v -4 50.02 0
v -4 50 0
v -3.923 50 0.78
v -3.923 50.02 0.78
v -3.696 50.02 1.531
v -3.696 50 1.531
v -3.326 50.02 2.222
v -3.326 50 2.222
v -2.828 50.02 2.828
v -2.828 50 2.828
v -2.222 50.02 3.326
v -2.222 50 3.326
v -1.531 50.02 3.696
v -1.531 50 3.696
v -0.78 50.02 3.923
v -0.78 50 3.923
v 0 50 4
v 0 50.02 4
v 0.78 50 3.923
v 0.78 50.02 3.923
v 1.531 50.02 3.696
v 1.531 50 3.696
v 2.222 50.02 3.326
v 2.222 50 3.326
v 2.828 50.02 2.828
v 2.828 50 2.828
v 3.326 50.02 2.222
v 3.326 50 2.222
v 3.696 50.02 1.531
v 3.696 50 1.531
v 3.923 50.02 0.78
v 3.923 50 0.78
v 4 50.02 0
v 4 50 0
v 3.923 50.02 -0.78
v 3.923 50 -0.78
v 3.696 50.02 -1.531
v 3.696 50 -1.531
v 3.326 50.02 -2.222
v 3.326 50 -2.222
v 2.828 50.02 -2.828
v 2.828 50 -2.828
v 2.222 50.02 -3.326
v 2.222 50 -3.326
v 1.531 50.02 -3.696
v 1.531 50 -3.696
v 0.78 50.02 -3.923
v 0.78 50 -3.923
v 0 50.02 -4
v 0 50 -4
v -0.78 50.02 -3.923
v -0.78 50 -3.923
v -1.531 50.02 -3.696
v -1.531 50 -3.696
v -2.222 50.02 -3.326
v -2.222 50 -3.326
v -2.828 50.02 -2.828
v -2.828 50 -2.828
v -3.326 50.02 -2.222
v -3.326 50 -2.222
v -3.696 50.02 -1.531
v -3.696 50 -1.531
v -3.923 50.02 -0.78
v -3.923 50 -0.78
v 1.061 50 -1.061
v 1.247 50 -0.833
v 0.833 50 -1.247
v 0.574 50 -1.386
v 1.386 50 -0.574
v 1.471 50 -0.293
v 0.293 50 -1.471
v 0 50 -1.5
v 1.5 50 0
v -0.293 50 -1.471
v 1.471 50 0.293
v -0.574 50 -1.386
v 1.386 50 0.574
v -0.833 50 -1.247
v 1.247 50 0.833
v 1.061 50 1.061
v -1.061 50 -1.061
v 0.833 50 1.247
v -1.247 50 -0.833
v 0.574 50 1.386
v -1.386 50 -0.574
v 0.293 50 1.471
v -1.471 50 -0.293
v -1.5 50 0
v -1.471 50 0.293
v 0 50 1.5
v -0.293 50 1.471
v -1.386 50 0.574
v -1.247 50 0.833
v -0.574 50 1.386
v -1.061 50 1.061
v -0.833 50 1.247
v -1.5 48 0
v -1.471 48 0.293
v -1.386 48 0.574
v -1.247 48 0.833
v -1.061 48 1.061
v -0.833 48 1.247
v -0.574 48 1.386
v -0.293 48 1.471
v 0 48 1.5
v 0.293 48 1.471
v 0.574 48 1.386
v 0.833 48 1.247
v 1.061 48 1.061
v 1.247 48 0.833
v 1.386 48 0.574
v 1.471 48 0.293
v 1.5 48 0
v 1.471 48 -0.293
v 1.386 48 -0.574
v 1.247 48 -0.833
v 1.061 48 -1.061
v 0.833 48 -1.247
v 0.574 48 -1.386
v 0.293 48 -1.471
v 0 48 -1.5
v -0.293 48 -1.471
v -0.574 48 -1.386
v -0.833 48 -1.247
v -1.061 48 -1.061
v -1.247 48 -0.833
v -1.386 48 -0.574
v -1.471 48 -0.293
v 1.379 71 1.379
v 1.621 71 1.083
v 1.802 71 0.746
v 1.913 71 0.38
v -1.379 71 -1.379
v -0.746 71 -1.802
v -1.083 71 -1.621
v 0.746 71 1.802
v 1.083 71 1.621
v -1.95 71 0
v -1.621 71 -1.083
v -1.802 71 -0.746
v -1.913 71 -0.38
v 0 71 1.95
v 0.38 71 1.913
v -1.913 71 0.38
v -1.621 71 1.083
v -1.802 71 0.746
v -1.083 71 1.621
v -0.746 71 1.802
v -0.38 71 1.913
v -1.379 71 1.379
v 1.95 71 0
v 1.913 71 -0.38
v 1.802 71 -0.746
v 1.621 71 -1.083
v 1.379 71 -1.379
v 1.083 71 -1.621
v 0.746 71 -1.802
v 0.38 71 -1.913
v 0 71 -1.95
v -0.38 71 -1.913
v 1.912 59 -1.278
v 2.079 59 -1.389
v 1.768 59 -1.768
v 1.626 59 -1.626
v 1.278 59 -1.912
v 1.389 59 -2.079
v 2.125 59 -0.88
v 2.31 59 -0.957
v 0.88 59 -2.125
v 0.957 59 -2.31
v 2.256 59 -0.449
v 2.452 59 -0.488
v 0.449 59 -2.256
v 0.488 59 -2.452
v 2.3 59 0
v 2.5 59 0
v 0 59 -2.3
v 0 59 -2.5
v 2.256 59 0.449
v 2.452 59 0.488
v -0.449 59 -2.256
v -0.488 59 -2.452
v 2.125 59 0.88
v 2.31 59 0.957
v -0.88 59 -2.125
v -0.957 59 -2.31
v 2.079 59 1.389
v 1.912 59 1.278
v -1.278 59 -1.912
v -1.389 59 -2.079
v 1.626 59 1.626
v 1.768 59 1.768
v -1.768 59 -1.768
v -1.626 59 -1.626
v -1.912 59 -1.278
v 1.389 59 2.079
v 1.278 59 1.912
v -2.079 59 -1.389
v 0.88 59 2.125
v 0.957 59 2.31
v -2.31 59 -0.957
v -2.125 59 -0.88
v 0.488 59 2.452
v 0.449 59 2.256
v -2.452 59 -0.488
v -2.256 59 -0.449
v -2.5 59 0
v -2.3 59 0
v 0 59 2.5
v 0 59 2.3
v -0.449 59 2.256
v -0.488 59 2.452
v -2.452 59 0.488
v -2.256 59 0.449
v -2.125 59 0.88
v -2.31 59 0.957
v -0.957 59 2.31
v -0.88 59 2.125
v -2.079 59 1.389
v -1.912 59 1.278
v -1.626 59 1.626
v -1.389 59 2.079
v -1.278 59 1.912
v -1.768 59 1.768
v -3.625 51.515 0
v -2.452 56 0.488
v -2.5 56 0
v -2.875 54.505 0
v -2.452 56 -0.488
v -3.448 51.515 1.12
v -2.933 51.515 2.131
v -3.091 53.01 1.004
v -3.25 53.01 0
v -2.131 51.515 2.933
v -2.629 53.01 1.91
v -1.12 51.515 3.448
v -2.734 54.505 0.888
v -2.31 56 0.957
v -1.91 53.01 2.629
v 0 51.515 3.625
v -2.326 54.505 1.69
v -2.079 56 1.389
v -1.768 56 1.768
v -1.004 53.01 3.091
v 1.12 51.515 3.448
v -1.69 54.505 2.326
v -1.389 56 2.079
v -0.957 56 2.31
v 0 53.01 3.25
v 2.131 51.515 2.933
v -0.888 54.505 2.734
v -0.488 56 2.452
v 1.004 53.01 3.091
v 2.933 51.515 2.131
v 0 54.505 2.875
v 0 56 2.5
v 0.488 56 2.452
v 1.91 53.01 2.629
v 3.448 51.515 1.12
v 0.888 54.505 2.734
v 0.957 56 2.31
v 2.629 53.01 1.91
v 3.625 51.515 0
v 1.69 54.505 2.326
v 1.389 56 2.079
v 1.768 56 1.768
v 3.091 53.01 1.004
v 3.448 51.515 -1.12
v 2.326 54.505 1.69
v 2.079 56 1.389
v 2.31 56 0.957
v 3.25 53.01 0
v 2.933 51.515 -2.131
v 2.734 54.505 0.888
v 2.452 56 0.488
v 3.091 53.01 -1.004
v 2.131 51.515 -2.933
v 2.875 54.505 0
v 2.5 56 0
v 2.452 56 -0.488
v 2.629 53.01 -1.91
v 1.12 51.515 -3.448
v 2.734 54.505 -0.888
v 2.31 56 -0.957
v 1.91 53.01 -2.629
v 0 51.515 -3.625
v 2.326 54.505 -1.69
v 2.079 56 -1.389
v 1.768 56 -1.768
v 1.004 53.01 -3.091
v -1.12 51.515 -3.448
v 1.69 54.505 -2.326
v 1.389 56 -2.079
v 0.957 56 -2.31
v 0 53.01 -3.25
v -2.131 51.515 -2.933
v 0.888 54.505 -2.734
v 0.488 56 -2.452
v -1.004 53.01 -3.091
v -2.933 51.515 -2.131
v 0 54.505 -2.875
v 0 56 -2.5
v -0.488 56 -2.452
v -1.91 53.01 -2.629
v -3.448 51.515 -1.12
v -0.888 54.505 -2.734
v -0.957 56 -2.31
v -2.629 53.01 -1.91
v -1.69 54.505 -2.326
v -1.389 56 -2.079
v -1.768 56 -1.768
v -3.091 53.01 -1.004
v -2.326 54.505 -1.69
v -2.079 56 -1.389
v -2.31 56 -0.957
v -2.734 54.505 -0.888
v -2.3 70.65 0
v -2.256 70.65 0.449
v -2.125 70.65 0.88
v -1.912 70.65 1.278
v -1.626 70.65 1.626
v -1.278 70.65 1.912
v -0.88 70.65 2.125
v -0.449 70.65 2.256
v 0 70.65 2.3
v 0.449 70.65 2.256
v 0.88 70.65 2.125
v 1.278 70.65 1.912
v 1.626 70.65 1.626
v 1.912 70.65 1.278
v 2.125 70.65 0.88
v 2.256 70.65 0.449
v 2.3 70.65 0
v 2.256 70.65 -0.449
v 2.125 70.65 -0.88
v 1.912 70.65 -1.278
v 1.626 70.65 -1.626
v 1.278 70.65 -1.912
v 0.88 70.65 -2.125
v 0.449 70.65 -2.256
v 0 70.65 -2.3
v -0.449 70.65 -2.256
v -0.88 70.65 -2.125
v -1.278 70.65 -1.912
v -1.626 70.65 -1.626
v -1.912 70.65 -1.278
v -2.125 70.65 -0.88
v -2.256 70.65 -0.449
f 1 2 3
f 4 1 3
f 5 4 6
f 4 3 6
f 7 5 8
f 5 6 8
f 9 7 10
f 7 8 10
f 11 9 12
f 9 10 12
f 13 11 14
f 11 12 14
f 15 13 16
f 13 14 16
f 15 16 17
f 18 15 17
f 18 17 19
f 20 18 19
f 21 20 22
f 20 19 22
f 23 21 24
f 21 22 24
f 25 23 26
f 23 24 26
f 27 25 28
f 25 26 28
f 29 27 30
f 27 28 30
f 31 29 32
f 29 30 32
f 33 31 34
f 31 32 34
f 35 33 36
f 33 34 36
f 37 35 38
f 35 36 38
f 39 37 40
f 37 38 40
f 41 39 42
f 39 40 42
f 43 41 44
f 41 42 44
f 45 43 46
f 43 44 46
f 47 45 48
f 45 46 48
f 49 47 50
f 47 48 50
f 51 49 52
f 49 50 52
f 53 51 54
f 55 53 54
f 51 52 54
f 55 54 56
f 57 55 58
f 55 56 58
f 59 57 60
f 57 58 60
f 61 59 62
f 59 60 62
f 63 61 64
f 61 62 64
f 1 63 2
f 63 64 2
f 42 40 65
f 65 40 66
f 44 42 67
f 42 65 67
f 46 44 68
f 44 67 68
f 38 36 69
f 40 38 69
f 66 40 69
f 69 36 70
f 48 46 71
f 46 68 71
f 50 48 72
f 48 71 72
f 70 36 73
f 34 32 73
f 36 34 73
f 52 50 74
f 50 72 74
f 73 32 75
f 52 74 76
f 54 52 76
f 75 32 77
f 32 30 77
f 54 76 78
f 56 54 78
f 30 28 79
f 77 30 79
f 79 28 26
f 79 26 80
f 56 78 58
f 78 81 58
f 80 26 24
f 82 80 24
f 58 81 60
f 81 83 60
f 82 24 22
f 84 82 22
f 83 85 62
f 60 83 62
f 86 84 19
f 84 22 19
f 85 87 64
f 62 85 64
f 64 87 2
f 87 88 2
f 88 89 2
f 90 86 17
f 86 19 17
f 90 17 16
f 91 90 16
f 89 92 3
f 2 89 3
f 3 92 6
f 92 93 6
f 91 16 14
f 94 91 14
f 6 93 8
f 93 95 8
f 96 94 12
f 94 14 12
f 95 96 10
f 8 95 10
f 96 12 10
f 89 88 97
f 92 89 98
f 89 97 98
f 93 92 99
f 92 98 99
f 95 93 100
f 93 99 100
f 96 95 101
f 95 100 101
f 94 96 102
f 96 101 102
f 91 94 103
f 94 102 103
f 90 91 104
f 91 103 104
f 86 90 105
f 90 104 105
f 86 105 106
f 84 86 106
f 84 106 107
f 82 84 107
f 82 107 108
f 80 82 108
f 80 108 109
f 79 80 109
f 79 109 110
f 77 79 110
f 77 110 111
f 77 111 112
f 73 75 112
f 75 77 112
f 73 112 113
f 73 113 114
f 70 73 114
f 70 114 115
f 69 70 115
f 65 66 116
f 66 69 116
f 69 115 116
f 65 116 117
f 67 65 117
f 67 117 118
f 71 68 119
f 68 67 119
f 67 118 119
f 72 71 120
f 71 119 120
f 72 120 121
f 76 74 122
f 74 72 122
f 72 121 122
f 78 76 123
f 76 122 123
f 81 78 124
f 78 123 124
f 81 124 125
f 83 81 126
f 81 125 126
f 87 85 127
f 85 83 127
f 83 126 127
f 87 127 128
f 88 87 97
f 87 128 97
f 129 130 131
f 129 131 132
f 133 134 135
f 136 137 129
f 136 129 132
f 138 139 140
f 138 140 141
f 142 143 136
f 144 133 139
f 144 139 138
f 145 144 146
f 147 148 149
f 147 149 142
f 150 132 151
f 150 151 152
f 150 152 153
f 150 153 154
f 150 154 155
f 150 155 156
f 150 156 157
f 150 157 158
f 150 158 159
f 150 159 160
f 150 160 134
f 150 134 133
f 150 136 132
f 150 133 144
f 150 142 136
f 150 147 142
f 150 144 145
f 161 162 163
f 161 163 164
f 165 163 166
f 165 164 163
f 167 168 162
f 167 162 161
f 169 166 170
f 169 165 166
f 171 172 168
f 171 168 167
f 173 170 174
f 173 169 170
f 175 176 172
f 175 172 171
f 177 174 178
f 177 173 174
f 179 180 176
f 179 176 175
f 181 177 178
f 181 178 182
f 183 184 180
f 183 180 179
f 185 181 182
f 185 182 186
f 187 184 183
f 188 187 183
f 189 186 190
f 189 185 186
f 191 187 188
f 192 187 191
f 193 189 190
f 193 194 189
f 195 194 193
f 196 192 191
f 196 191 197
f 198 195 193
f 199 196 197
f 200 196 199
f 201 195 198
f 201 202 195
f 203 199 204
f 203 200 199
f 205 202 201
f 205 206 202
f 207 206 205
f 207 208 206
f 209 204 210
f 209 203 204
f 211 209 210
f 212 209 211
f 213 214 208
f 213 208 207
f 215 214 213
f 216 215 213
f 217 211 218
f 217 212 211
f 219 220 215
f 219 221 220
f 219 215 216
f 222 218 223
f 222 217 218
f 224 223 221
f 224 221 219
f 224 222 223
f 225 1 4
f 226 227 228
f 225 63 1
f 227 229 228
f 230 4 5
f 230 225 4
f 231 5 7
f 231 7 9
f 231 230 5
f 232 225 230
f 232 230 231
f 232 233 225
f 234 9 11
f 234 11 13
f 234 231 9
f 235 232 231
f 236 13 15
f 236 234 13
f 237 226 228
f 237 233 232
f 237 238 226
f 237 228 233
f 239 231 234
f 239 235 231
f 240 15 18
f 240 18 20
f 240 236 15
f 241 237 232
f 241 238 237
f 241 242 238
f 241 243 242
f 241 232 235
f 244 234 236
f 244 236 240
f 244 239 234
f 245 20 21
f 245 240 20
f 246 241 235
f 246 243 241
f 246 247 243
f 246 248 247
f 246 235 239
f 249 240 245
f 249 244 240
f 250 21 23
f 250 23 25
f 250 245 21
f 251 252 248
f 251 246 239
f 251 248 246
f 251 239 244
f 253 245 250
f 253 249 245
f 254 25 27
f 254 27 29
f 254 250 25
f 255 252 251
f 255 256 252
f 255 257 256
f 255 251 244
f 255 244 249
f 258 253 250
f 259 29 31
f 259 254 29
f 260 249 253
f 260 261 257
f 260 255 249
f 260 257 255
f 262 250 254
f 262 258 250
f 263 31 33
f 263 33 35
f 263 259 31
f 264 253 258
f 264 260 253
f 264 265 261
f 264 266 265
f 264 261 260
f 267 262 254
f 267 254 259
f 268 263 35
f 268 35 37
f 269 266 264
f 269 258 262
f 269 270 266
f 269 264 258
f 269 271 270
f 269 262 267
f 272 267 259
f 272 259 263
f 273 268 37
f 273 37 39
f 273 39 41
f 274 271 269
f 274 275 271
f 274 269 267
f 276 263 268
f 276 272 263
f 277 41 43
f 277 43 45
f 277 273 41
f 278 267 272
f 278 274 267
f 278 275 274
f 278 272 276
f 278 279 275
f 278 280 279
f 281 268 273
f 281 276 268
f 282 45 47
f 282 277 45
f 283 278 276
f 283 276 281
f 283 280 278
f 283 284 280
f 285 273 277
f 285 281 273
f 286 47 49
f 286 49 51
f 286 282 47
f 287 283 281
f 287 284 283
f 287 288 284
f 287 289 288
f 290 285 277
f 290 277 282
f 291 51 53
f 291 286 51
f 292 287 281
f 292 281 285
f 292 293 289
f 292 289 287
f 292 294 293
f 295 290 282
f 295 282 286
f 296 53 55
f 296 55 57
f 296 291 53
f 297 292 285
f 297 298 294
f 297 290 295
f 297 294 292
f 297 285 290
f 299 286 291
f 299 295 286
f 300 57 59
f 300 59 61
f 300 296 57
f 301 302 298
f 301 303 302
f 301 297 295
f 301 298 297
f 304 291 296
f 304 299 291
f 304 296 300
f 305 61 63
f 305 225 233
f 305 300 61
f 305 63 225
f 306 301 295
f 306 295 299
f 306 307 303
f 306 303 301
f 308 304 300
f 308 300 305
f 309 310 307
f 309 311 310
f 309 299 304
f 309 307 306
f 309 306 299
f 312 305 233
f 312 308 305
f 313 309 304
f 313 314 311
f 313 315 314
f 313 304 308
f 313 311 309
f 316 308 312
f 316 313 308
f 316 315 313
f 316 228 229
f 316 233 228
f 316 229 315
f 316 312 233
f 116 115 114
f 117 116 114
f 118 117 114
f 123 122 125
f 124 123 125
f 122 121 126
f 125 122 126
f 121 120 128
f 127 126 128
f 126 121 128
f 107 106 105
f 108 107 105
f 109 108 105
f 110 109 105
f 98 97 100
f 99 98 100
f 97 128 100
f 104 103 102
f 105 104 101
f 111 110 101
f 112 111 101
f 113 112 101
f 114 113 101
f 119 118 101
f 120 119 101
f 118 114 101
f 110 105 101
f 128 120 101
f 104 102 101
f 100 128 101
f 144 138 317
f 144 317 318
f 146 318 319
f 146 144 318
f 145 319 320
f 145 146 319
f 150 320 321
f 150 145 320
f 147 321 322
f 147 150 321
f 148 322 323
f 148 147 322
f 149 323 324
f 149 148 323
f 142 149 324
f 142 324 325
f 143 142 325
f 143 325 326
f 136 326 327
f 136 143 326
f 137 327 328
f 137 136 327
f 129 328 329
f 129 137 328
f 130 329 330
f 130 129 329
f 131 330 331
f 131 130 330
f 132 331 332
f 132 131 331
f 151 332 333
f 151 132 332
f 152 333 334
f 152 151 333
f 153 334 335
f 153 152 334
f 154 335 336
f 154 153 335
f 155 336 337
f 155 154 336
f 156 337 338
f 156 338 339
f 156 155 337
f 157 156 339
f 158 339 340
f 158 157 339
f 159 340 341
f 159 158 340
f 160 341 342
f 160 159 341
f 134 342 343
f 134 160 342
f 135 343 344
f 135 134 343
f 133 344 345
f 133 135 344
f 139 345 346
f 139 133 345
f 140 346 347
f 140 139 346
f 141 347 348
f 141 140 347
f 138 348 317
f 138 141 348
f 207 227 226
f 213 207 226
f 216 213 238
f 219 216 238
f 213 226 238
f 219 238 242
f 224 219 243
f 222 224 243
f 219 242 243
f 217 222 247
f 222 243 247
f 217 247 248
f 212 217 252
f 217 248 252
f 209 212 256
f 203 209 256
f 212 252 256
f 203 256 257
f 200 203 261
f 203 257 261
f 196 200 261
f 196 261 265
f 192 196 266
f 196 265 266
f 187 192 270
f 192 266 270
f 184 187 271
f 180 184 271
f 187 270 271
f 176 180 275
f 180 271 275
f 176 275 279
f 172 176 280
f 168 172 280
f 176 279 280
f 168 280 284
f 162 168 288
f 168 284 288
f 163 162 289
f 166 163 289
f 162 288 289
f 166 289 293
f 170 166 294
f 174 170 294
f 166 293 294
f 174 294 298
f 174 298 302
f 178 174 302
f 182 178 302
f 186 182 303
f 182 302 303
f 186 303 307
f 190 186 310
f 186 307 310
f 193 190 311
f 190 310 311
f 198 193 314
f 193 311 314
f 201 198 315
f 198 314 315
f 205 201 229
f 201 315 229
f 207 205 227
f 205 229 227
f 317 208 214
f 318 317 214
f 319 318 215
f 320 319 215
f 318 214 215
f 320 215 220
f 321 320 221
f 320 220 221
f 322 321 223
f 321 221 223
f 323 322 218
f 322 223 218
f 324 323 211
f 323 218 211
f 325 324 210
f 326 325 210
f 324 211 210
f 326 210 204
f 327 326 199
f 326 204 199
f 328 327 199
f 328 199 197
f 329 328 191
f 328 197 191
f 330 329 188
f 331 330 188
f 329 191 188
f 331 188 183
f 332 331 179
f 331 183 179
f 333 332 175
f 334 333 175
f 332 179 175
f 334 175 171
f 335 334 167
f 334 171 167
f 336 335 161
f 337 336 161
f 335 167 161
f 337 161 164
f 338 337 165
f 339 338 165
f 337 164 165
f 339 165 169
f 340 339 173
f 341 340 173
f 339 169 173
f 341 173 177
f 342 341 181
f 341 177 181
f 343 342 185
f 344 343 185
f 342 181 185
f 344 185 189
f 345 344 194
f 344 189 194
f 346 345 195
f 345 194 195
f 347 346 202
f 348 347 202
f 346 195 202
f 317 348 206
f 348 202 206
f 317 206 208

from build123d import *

# Parameters (mm, degrees)
CYLINDER022_R             = 2.3
CYLINDER022_DEPTH         = 12
CHAMFER002_SIZE           = 0.35
CYLINDER021_R             = 2.5
CYLINDER021_DEPTH         = 3
CYLINDER020_R             = 4
CYLINDER020_DEPTH         = 6
CHAMFER001_SIZE2          = 1.5
CHAMFER001_SIZE           = 5.98
CYLINDER019_R             = 1.5
CYLINDER019_DEPTH         = 10
FUSION005_ROLL_ANGLE      = 90
FUSION005_PLACEMENT_ANGLE = 180


with BuildPart() as chamfer002:
    # Cylinder022 → Cylinder022 (new body)
    with BuildSketch(Plane.XY.offset(39)):
        Circle(CYLINDER022_R)
    extrude(amount=CYLINDER022_DEPTH)

    # Chamfer002
    chamfer002_edges = [chamfer002.edges().sort_by_distance(p)[0] for p in [
        (-2.3, 0, 51),
    ]]
    chamfer(chamfer002_edges, length=CHAMFER002_SIZE)


with BuildPart() as cylinder021:
    # Cylinder021 → Cylinder021 (new body)
    with BuildSketch(Plane.XY.offset(36)):
        Circle(CYLINDER021_R)
    extrude(amount=CYLINDER021_DEPTH)


with BuildPart() as fusion003:
    # Cylinder020 → Cylinder020 (new body)
    with BuildSketch(Plane.XY):
        Circle(CYLINDER020_R)
    extrude(amount=CYLINDER020_DEPTH)

    # Chamfer001
    chamfer001_edges = [fusion003.edges().sort_by_distance(p)[0] for p in [
        (-4, 0, 6),
    ]]
    chamfer001_side = fusion003.faces().sort_by_distance((-4, 0, 3))[0]
    chamfer(chamfer001_edges, length=CHAMFER001_SIZE, length2=CHAMFER001_SIZE2, reference=chamfer001_side)


with BuildPart() as fusion003_1:
    # Chamfer001 placement: moved
    add(fusion003.part.moved(Location((0, 0, 30))))

    # Fusion003: union Cylinder021
    add(cylinder021.part)


with BuildPart() as rotor_shaft:
    # Cylinder019 → Cylinder019 (new body)
    with BuildSketch(Plane.XY.offset(28)):
        Circle(CYLINDER019_R)
    extrude(amount=CYLINDER019_DEPTH)

    # Fusion004: union Fusion003
    add(fusion003_1.part)

    # Fusion005: union Chamfer002
    add(chamfer002.part)


with BuildPart() as rotor_shaft_1:
    # Fusion005 roll: moved
    add(rotor_shaft.part.rotate(Axis((0, 0, 0), (1, 0, 0)), FUSION005_ROLL_ANGLE))


with BuildPart() as rotor_shaft_2:
    # Fusion005 placement: moved
    add(rotor_shaft_1.part.moved(Location((0, 20, 0))).rotate(Axis((0, 20, 0), (0, 0, 1)), FUSION005_PLACEMENT_ANGLE))


solid = rotor_shaft_2.part
